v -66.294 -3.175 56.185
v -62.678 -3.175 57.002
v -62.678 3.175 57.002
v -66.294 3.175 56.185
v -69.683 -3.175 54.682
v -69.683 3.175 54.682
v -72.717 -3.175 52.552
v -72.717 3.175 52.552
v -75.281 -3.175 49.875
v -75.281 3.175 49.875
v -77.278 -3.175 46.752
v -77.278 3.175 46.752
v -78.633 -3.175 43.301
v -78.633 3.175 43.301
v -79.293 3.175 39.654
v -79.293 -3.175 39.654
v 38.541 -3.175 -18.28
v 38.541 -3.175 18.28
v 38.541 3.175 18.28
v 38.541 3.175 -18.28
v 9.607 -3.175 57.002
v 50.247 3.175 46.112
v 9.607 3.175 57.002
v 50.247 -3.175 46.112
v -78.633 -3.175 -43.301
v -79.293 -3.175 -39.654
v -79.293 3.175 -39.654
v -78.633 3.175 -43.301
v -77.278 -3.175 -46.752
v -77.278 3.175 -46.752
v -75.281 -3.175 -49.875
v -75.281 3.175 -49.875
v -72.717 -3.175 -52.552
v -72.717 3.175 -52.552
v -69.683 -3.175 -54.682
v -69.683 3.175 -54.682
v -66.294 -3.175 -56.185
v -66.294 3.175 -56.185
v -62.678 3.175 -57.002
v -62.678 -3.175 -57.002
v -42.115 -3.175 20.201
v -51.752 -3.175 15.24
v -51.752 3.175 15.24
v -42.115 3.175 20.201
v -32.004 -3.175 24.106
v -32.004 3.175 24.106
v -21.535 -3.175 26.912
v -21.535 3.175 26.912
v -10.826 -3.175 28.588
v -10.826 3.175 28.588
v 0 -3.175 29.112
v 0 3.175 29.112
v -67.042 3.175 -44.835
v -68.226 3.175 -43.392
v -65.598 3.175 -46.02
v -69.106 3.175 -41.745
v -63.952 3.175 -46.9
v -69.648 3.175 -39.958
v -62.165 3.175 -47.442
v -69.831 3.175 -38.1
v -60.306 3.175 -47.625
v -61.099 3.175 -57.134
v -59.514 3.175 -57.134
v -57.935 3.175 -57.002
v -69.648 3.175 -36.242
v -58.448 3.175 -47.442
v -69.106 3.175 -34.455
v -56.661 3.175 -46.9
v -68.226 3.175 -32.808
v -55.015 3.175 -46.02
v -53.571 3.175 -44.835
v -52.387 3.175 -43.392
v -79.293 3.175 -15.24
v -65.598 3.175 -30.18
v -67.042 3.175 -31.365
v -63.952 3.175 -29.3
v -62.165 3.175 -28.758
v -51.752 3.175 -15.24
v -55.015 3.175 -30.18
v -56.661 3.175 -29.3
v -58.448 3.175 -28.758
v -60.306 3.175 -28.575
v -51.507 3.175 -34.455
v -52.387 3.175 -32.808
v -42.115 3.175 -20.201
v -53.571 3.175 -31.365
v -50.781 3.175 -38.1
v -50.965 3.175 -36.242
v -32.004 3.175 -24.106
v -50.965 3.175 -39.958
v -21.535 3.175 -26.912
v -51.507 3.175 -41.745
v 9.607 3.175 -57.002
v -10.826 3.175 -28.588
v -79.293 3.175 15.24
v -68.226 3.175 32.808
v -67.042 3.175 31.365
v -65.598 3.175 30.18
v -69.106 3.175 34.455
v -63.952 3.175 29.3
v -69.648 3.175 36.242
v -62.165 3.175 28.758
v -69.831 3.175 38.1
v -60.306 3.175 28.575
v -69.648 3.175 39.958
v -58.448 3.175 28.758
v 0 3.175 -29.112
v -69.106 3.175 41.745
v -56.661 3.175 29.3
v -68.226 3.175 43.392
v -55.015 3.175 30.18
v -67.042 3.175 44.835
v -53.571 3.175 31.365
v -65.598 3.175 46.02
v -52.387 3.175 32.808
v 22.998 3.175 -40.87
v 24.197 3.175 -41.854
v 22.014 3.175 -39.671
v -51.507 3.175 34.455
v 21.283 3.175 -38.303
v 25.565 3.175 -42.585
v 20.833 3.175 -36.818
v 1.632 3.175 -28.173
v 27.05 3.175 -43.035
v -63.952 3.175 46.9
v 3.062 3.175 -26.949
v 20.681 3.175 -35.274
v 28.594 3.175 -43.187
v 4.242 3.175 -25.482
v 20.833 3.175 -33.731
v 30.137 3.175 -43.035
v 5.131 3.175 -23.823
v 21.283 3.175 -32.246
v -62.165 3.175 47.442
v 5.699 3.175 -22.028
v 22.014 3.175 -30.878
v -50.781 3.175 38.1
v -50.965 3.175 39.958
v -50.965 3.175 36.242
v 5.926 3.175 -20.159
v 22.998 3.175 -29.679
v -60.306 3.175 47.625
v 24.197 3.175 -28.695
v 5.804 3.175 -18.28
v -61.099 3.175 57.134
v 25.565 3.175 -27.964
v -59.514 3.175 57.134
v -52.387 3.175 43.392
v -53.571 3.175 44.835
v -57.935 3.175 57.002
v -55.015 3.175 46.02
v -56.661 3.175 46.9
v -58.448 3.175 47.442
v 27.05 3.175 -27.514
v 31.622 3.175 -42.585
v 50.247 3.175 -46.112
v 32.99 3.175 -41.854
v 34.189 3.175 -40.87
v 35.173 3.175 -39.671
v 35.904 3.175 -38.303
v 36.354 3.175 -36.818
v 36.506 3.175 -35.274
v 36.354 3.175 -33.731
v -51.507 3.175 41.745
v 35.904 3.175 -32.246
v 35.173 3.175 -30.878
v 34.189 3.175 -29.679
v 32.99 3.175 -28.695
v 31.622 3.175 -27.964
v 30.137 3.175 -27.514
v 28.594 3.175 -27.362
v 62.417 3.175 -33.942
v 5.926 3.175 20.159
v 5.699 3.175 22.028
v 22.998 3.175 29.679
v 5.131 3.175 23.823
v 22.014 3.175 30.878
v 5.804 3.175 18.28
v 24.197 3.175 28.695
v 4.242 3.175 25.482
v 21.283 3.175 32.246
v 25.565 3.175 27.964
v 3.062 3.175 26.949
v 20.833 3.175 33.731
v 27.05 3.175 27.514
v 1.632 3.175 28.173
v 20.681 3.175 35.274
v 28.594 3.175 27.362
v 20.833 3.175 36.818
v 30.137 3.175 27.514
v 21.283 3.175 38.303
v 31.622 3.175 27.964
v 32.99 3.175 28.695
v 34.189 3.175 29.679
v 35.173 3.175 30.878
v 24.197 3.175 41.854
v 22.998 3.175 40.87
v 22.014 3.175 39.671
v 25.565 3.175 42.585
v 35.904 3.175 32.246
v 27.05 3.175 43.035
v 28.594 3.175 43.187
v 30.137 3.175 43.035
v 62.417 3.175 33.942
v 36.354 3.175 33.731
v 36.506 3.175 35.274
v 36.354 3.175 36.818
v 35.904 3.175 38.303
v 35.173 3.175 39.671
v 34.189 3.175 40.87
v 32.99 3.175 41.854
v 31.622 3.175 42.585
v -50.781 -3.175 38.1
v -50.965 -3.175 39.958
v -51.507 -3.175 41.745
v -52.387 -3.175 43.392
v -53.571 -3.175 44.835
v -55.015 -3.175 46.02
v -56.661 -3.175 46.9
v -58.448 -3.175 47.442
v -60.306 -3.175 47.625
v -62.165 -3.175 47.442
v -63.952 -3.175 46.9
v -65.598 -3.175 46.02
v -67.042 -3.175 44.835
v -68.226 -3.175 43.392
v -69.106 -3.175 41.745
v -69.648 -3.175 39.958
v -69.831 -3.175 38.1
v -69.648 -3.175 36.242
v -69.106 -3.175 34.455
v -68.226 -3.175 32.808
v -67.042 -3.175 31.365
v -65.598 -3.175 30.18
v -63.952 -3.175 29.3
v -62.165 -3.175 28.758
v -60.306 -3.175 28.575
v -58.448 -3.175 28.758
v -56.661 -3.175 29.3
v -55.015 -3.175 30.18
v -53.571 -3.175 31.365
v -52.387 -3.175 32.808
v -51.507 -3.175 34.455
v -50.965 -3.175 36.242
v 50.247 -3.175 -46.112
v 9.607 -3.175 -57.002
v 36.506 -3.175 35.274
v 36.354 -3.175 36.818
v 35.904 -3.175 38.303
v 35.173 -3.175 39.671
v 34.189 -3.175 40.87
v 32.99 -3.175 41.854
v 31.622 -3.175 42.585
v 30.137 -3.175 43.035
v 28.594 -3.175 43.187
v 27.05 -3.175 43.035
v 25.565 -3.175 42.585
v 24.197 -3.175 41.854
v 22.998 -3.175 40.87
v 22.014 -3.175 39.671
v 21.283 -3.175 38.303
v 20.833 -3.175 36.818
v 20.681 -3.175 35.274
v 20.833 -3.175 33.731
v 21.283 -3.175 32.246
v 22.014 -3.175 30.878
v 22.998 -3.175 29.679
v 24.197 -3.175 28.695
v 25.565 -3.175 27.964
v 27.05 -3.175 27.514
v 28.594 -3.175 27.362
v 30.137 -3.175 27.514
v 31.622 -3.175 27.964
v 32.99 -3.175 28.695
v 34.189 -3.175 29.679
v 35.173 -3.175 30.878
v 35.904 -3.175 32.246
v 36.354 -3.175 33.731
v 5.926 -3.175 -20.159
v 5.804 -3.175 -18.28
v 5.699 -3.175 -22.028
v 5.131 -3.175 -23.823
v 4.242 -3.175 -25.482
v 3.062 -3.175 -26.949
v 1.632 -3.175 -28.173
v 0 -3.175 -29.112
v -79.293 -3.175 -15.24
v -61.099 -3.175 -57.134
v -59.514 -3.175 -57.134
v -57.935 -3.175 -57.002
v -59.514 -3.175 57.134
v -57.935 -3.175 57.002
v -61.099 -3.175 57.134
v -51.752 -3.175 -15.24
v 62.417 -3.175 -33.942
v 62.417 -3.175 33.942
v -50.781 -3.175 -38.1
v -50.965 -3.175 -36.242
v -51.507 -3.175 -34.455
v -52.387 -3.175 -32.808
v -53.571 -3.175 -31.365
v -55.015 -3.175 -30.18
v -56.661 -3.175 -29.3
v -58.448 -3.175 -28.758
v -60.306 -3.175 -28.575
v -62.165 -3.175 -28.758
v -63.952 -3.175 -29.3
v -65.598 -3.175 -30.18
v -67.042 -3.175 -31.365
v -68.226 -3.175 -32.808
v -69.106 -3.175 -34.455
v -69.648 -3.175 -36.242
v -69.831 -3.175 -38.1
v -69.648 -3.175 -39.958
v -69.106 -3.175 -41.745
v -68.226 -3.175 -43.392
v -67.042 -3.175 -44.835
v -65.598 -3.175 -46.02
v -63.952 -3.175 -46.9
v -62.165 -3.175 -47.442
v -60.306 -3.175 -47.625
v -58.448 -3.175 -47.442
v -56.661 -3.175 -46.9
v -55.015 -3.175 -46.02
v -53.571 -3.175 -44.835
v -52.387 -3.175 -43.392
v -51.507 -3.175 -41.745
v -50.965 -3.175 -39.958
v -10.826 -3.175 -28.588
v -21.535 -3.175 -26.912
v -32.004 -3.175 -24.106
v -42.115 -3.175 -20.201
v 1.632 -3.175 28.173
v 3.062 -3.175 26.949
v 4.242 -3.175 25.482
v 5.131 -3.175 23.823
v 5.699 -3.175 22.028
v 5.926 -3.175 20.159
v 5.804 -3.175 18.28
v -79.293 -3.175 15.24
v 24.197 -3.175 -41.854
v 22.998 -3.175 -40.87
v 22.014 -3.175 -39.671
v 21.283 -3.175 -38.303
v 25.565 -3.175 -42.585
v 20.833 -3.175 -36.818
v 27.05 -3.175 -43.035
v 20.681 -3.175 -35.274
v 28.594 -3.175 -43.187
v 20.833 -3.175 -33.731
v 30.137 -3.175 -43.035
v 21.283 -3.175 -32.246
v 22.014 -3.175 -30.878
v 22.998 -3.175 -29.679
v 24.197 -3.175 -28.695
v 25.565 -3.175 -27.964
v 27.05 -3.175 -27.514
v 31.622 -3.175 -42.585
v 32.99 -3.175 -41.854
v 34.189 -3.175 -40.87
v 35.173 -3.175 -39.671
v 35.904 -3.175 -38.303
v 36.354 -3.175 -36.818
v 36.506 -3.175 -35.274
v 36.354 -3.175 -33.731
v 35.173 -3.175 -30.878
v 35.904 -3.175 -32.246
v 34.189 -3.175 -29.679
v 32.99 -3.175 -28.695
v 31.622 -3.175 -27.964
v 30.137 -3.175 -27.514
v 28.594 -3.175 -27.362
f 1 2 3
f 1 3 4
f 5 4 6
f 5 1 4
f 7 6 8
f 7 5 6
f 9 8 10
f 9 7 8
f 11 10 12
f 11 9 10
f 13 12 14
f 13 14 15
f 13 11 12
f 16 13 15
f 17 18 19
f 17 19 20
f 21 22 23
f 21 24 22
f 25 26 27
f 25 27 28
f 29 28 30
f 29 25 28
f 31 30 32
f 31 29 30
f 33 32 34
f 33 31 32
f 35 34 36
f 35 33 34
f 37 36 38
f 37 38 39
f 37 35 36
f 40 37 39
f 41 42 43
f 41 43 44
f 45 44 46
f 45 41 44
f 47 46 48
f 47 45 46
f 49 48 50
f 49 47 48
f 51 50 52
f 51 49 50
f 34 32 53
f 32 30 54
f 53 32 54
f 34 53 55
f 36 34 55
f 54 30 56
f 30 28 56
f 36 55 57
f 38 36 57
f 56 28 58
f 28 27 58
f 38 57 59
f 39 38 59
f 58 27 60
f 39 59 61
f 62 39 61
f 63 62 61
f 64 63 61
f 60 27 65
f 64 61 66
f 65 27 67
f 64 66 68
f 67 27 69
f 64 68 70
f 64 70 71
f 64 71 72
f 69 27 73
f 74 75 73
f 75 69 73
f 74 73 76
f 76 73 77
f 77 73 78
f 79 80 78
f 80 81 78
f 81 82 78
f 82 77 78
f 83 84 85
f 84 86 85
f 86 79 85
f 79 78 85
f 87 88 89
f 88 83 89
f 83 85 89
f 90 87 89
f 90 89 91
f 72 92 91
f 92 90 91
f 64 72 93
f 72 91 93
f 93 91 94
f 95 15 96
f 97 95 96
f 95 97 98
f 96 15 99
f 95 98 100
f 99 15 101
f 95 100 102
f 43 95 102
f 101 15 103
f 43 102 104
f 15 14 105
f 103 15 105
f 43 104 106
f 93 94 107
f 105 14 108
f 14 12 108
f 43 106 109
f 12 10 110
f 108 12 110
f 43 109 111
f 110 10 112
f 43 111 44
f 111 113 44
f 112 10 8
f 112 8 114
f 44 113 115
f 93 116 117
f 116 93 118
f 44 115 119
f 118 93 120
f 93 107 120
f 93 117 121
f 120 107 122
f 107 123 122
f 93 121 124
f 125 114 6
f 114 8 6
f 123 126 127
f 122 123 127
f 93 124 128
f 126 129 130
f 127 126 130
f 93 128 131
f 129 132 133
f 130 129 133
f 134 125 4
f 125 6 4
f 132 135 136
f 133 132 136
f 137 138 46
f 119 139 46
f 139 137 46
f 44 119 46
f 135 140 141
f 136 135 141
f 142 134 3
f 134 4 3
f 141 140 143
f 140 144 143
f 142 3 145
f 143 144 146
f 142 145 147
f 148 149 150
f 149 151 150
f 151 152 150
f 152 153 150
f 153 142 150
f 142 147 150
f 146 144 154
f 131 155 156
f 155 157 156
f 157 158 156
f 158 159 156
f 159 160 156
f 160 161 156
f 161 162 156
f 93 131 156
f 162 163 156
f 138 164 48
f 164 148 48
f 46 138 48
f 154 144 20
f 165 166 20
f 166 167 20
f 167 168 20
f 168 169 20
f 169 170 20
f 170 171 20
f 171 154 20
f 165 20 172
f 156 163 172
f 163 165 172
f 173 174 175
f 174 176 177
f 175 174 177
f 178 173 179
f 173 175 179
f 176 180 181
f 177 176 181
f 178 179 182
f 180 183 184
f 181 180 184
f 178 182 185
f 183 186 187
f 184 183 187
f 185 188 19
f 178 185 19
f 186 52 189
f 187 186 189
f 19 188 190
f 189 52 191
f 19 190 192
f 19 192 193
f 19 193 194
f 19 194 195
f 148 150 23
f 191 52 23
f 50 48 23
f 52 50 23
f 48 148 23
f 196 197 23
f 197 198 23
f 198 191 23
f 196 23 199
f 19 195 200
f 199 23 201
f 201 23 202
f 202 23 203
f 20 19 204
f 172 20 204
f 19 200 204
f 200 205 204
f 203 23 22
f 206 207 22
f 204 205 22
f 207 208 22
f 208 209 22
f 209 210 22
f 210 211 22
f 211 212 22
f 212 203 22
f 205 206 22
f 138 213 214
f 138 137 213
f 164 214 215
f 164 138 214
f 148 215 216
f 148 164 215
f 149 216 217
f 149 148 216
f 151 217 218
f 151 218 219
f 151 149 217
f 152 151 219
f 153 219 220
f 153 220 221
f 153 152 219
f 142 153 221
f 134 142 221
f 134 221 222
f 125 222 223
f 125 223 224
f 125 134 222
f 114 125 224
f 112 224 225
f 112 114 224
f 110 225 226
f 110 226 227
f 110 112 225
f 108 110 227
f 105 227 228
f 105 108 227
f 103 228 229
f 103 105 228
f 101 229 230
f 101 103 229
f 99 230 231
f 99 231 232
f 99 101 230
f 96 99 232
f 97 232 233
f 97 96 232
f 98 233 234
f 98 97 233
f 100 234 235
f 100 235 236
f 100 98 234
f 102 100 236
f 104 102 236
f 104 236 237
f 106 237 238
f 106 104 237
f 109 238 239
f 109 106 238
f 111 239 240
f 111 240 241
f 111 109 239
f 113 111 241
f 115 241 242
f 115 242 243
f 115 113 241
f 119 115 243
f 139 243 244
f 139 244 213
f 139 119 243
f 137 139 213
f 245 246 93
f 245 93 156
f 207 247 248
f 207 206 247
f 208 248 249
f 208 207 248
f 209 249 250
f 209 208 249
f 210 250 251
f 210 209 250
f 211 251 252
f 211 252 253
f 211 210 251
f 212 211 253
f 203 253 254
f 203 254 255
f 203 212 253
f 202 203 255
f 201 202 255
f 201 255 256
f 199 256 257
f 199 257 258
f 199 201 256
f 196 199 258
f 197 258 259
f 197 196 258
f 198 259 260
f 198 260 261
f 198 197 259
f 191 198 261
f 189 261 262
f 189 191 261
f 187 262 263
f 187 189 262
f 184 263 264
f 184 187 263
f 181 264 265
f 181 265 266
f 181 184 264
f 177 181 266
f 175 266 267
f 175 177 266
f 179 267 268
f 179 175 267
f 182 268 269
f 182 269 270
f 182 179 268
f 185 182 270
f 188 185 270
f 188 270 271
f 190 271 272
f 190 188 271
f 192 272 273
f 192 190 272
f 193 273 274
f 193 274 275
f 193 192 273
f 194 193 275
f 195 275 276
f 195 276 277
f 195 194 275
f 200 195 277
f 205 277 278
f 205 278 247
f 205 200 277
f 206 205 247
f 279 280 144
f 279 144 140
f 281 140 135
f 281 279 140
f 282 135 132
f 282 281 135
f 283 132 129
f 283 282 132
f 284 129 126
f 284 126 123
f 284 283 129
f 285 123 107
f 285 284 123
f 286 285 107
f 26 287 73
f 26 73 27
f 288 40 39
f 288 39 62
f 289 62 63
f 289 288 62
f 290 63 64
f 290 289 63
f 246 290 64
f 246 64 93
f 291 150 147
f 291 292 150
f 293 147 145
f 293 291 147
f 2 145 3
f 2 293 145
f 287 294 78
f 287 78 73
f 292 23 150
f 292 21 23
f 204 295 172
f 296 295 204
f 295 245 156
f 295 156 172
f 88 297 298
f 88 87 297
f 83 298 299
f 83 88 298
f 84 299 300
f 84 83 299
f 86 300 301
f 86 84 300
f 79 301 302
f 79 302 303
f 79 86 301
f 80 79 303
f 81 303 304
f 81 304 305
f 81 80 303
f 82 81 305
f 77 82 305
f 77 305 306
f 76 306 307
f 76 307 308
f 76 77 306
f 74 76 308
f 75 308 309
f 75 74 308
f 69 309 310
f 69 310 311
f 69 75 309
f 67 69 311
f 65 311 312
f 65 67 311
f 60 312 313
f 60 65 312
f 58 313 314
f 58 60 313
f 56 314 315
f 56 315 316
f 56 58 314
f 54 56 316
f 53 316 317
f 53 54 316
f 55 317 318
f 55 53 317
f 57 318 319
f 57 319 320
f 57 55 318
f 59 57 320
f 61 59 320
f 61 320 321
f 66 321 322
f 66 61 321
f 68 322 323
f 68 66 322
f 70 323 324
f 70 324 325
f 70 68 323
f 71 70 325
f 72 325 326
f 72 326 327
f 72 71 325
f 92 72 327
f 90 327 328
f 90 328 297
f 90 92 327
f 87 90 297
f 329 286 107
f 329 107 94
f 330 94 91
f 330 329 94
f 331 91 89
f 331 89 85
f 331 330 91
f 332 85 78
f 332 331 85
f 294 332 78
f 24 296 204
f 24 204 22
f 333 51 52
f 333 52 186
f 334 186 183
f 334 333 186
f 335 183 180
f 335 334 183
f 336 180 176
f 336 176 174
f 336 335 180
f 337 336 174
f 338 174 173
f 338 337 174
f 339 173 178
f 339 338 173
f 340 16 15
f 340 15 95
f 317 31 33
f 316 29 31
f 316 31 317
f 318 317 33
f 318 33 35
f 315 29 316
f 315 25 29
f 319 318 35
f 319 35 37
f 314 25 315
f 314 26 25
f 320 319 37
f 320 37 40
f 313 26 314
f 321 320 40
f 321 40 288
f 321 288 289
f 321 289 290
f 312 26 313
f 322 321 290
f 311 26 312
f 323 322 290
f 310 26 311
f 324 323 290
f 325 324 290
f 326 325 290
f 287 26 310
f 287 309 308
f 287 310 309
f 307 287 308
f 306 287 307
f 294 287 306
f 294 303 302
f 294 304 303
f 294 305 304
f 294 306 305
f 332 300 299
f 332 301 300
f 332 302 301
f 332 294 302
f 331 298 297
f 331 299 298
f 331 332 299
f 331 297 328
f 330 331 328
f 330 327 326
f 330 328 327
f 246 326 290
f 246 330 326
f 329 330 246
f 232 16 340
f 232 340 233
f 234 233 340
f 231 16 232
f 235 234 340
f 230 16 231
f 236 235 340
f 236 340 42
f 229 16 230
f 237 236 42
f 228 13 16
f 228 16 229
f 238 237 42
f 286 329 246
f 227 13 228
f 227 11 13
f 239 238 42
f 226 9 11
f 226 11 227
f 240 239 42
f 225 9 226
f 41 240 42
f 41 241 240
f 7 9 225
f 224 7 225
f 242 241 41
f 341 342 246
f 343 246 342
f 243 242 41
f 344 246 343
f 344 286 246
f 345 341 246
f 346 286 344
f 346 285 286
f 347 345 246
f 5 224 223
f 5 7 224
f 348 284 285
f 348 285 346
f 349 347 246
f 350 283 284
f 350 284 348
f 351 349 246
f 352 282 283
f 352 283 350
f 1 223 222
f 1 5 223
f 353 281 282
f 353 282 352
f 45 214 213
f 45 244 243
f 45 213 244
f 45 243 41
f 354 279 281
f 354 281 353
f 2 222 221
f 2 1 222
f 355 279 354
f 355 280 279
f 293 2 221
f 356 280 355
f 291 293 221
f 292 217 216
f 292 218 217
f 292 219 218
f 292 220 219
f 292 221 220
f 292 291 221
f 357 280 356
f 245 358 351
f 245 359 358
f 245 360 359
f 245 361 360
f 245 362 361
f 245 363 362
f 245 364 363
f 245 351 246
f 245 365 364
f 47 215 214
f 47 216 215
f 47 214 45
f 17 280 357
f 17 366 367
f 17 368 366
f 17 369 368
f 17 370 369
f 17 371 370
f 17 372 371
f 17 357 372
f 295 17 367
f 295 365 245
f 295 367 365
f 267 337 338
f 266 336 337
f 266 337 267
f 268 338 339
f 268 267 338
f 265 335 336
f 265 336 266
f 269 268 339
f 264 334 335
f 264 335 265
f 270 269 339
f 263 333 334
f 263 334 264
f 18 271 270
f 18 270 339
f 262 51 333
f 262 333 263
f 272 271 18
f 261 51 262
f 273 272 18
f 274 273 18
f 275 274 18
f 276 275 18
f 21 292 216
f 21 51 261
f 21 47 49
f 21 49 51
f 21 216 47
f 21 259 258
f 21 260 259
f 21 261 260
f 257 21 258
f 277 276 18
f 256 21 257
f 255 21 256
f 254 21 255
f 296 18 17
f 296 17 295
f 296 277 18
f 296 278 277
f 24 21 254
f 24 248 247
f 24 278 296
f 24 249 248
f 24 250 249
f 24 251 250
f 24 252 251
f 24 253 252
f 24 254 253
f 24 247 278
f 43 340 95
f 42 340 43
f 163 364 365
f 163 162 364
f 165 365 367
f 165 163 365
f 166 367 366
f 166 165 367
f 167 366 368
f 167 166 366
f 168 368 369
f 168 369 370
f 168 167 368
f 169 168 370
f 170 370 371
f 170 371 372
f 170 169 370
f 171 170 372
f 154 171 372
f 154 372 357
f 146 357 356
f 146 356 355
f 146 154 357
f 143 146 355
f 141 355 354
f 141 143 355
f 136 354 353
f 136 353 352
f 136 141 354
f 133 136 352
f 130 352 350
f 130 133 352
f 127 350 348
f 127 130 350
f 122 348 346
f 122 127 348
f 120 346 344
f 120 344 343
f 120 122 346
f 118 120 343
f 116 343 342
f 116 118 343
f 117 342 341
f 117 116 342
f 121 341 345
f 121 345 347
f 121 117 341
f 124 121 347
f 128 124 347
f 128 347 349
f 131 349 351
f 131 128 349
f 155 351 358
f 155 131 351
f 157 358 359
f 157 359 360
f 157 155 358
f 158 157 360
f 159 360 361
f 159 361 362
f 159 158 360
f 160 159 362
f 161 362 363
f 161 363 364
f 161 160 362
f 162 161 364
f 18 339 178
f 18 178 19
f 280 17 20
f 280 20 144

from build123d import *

# Parameters (mm, degrees)
F0_R     = 9.525
F0_R_2   = 7.91296
F1_DEPTH = 3.175


with BuildPart() as f1:
    # F0 (on Front) → F1 (new body, symmetric)
    with BuildSketch(Plane.XZ):
        with BuildLine():
            ThreePointArc((-57.934586, 57.001762), (-60.306483, 57.15), (-62.67838, 57.001762))
            Line((-62.67838, 57.001762), (-57.934586, 57.001762))
        make_face()
        with BuildLine():
            Line((-57.934586, 57.001762), (-62.67838, 57.001762))
            ThreePointArc((-62.67838, 57.001762), (-74.064603, 51.276367), (-79.29303, 39.653556))
            Line((-79.29303, 39.653556), (-79.29303, 15.24))
            Line((-79.29303, 15.24), (-51.752072, 15.24))
            ThreePointArc((-51.752072, 15.24), (-26.806955, 25.649029), (0, 29.112254))
            ThreePointArc((0, 29.112254), (4.725363, 24.672997), (5.803779, 18.279791))
            Line((5.803779, 18.279791), (38.5414, 18.279791))
            Line((38.5414, 18.279791), (38.5414, 0))
            Line((38.5414, 0), (38.5414, -18.279791))
            Line((38.5414, -18.279791), (5.803779, -18.279791))
            ThreePointArc((5.803779, -18.279791), (4.725363, -24.672997), (0, -29.112254))
            ThreePointArc((0, -29.112254), (-26.806955, -25.649029), (-51.752072, -15.24))
            Line((-51.752072, -15.24), (-79.29303, -15.24))
            Line((-79.29303, -15.24), (-79.29303, -39.653556))
            ThreePointArc((-79.29303, -39.653556), (-74.064603, -51.276367), (-62.67838, -57.001762))
            Line((-62.67838, -57.001762), (-57.934586, -57.001762))
            Line((-57.934586, -57.001762), (9.60697, -57.001762))
            Line((9.60697, -57.001762), (50.24697, -46.112307))
            Line((50.24697, -46.112307), (62.4174, -33.941876))
            Line((62.4174, -33.941876), (62.4174, -5.23346))
            Line((62.4174, -5.23346), (62.4174, 5.23346))
            Line((62.4174, 5.23346), (62.4174, 33.941876))
            Line((62.4174, 33.941876), (50.24697, 46.112307))
            Line((50.24697, 46.112307), (9.60697, 57.001762))
            Line((9.60697, 57.001762), (-57.934586, 57.001762))
        make_face()
        with Locations((-60.306483, -38.1)):
            Circle(F0_R, mode=Mode.SUBTRACT)
        with Locations((28.593517, -35.27448)):
            Circle(F0_R_2, mode=Mode.SUBTRACT)
        with Locations((-60.306483, 38.1)):
            Circle(F0_R, mode=Mode.SUBTRACT)
        with Locations((28.593517, 35.27448)):
            Circle(F0_R_2, mode=Mode.SUBTRACT)
        with BuildLine():
            ThreePointArc((-62.67838, -57.001762), (-60.306483, -57.15), (-57.934586, -57.001762))
            Line((-57.934586, -57.001762), (-62.67838, -57.001762))
        make_face()
    extrude(amount=F1_DEPTH, both=True)


solid = f1.part
